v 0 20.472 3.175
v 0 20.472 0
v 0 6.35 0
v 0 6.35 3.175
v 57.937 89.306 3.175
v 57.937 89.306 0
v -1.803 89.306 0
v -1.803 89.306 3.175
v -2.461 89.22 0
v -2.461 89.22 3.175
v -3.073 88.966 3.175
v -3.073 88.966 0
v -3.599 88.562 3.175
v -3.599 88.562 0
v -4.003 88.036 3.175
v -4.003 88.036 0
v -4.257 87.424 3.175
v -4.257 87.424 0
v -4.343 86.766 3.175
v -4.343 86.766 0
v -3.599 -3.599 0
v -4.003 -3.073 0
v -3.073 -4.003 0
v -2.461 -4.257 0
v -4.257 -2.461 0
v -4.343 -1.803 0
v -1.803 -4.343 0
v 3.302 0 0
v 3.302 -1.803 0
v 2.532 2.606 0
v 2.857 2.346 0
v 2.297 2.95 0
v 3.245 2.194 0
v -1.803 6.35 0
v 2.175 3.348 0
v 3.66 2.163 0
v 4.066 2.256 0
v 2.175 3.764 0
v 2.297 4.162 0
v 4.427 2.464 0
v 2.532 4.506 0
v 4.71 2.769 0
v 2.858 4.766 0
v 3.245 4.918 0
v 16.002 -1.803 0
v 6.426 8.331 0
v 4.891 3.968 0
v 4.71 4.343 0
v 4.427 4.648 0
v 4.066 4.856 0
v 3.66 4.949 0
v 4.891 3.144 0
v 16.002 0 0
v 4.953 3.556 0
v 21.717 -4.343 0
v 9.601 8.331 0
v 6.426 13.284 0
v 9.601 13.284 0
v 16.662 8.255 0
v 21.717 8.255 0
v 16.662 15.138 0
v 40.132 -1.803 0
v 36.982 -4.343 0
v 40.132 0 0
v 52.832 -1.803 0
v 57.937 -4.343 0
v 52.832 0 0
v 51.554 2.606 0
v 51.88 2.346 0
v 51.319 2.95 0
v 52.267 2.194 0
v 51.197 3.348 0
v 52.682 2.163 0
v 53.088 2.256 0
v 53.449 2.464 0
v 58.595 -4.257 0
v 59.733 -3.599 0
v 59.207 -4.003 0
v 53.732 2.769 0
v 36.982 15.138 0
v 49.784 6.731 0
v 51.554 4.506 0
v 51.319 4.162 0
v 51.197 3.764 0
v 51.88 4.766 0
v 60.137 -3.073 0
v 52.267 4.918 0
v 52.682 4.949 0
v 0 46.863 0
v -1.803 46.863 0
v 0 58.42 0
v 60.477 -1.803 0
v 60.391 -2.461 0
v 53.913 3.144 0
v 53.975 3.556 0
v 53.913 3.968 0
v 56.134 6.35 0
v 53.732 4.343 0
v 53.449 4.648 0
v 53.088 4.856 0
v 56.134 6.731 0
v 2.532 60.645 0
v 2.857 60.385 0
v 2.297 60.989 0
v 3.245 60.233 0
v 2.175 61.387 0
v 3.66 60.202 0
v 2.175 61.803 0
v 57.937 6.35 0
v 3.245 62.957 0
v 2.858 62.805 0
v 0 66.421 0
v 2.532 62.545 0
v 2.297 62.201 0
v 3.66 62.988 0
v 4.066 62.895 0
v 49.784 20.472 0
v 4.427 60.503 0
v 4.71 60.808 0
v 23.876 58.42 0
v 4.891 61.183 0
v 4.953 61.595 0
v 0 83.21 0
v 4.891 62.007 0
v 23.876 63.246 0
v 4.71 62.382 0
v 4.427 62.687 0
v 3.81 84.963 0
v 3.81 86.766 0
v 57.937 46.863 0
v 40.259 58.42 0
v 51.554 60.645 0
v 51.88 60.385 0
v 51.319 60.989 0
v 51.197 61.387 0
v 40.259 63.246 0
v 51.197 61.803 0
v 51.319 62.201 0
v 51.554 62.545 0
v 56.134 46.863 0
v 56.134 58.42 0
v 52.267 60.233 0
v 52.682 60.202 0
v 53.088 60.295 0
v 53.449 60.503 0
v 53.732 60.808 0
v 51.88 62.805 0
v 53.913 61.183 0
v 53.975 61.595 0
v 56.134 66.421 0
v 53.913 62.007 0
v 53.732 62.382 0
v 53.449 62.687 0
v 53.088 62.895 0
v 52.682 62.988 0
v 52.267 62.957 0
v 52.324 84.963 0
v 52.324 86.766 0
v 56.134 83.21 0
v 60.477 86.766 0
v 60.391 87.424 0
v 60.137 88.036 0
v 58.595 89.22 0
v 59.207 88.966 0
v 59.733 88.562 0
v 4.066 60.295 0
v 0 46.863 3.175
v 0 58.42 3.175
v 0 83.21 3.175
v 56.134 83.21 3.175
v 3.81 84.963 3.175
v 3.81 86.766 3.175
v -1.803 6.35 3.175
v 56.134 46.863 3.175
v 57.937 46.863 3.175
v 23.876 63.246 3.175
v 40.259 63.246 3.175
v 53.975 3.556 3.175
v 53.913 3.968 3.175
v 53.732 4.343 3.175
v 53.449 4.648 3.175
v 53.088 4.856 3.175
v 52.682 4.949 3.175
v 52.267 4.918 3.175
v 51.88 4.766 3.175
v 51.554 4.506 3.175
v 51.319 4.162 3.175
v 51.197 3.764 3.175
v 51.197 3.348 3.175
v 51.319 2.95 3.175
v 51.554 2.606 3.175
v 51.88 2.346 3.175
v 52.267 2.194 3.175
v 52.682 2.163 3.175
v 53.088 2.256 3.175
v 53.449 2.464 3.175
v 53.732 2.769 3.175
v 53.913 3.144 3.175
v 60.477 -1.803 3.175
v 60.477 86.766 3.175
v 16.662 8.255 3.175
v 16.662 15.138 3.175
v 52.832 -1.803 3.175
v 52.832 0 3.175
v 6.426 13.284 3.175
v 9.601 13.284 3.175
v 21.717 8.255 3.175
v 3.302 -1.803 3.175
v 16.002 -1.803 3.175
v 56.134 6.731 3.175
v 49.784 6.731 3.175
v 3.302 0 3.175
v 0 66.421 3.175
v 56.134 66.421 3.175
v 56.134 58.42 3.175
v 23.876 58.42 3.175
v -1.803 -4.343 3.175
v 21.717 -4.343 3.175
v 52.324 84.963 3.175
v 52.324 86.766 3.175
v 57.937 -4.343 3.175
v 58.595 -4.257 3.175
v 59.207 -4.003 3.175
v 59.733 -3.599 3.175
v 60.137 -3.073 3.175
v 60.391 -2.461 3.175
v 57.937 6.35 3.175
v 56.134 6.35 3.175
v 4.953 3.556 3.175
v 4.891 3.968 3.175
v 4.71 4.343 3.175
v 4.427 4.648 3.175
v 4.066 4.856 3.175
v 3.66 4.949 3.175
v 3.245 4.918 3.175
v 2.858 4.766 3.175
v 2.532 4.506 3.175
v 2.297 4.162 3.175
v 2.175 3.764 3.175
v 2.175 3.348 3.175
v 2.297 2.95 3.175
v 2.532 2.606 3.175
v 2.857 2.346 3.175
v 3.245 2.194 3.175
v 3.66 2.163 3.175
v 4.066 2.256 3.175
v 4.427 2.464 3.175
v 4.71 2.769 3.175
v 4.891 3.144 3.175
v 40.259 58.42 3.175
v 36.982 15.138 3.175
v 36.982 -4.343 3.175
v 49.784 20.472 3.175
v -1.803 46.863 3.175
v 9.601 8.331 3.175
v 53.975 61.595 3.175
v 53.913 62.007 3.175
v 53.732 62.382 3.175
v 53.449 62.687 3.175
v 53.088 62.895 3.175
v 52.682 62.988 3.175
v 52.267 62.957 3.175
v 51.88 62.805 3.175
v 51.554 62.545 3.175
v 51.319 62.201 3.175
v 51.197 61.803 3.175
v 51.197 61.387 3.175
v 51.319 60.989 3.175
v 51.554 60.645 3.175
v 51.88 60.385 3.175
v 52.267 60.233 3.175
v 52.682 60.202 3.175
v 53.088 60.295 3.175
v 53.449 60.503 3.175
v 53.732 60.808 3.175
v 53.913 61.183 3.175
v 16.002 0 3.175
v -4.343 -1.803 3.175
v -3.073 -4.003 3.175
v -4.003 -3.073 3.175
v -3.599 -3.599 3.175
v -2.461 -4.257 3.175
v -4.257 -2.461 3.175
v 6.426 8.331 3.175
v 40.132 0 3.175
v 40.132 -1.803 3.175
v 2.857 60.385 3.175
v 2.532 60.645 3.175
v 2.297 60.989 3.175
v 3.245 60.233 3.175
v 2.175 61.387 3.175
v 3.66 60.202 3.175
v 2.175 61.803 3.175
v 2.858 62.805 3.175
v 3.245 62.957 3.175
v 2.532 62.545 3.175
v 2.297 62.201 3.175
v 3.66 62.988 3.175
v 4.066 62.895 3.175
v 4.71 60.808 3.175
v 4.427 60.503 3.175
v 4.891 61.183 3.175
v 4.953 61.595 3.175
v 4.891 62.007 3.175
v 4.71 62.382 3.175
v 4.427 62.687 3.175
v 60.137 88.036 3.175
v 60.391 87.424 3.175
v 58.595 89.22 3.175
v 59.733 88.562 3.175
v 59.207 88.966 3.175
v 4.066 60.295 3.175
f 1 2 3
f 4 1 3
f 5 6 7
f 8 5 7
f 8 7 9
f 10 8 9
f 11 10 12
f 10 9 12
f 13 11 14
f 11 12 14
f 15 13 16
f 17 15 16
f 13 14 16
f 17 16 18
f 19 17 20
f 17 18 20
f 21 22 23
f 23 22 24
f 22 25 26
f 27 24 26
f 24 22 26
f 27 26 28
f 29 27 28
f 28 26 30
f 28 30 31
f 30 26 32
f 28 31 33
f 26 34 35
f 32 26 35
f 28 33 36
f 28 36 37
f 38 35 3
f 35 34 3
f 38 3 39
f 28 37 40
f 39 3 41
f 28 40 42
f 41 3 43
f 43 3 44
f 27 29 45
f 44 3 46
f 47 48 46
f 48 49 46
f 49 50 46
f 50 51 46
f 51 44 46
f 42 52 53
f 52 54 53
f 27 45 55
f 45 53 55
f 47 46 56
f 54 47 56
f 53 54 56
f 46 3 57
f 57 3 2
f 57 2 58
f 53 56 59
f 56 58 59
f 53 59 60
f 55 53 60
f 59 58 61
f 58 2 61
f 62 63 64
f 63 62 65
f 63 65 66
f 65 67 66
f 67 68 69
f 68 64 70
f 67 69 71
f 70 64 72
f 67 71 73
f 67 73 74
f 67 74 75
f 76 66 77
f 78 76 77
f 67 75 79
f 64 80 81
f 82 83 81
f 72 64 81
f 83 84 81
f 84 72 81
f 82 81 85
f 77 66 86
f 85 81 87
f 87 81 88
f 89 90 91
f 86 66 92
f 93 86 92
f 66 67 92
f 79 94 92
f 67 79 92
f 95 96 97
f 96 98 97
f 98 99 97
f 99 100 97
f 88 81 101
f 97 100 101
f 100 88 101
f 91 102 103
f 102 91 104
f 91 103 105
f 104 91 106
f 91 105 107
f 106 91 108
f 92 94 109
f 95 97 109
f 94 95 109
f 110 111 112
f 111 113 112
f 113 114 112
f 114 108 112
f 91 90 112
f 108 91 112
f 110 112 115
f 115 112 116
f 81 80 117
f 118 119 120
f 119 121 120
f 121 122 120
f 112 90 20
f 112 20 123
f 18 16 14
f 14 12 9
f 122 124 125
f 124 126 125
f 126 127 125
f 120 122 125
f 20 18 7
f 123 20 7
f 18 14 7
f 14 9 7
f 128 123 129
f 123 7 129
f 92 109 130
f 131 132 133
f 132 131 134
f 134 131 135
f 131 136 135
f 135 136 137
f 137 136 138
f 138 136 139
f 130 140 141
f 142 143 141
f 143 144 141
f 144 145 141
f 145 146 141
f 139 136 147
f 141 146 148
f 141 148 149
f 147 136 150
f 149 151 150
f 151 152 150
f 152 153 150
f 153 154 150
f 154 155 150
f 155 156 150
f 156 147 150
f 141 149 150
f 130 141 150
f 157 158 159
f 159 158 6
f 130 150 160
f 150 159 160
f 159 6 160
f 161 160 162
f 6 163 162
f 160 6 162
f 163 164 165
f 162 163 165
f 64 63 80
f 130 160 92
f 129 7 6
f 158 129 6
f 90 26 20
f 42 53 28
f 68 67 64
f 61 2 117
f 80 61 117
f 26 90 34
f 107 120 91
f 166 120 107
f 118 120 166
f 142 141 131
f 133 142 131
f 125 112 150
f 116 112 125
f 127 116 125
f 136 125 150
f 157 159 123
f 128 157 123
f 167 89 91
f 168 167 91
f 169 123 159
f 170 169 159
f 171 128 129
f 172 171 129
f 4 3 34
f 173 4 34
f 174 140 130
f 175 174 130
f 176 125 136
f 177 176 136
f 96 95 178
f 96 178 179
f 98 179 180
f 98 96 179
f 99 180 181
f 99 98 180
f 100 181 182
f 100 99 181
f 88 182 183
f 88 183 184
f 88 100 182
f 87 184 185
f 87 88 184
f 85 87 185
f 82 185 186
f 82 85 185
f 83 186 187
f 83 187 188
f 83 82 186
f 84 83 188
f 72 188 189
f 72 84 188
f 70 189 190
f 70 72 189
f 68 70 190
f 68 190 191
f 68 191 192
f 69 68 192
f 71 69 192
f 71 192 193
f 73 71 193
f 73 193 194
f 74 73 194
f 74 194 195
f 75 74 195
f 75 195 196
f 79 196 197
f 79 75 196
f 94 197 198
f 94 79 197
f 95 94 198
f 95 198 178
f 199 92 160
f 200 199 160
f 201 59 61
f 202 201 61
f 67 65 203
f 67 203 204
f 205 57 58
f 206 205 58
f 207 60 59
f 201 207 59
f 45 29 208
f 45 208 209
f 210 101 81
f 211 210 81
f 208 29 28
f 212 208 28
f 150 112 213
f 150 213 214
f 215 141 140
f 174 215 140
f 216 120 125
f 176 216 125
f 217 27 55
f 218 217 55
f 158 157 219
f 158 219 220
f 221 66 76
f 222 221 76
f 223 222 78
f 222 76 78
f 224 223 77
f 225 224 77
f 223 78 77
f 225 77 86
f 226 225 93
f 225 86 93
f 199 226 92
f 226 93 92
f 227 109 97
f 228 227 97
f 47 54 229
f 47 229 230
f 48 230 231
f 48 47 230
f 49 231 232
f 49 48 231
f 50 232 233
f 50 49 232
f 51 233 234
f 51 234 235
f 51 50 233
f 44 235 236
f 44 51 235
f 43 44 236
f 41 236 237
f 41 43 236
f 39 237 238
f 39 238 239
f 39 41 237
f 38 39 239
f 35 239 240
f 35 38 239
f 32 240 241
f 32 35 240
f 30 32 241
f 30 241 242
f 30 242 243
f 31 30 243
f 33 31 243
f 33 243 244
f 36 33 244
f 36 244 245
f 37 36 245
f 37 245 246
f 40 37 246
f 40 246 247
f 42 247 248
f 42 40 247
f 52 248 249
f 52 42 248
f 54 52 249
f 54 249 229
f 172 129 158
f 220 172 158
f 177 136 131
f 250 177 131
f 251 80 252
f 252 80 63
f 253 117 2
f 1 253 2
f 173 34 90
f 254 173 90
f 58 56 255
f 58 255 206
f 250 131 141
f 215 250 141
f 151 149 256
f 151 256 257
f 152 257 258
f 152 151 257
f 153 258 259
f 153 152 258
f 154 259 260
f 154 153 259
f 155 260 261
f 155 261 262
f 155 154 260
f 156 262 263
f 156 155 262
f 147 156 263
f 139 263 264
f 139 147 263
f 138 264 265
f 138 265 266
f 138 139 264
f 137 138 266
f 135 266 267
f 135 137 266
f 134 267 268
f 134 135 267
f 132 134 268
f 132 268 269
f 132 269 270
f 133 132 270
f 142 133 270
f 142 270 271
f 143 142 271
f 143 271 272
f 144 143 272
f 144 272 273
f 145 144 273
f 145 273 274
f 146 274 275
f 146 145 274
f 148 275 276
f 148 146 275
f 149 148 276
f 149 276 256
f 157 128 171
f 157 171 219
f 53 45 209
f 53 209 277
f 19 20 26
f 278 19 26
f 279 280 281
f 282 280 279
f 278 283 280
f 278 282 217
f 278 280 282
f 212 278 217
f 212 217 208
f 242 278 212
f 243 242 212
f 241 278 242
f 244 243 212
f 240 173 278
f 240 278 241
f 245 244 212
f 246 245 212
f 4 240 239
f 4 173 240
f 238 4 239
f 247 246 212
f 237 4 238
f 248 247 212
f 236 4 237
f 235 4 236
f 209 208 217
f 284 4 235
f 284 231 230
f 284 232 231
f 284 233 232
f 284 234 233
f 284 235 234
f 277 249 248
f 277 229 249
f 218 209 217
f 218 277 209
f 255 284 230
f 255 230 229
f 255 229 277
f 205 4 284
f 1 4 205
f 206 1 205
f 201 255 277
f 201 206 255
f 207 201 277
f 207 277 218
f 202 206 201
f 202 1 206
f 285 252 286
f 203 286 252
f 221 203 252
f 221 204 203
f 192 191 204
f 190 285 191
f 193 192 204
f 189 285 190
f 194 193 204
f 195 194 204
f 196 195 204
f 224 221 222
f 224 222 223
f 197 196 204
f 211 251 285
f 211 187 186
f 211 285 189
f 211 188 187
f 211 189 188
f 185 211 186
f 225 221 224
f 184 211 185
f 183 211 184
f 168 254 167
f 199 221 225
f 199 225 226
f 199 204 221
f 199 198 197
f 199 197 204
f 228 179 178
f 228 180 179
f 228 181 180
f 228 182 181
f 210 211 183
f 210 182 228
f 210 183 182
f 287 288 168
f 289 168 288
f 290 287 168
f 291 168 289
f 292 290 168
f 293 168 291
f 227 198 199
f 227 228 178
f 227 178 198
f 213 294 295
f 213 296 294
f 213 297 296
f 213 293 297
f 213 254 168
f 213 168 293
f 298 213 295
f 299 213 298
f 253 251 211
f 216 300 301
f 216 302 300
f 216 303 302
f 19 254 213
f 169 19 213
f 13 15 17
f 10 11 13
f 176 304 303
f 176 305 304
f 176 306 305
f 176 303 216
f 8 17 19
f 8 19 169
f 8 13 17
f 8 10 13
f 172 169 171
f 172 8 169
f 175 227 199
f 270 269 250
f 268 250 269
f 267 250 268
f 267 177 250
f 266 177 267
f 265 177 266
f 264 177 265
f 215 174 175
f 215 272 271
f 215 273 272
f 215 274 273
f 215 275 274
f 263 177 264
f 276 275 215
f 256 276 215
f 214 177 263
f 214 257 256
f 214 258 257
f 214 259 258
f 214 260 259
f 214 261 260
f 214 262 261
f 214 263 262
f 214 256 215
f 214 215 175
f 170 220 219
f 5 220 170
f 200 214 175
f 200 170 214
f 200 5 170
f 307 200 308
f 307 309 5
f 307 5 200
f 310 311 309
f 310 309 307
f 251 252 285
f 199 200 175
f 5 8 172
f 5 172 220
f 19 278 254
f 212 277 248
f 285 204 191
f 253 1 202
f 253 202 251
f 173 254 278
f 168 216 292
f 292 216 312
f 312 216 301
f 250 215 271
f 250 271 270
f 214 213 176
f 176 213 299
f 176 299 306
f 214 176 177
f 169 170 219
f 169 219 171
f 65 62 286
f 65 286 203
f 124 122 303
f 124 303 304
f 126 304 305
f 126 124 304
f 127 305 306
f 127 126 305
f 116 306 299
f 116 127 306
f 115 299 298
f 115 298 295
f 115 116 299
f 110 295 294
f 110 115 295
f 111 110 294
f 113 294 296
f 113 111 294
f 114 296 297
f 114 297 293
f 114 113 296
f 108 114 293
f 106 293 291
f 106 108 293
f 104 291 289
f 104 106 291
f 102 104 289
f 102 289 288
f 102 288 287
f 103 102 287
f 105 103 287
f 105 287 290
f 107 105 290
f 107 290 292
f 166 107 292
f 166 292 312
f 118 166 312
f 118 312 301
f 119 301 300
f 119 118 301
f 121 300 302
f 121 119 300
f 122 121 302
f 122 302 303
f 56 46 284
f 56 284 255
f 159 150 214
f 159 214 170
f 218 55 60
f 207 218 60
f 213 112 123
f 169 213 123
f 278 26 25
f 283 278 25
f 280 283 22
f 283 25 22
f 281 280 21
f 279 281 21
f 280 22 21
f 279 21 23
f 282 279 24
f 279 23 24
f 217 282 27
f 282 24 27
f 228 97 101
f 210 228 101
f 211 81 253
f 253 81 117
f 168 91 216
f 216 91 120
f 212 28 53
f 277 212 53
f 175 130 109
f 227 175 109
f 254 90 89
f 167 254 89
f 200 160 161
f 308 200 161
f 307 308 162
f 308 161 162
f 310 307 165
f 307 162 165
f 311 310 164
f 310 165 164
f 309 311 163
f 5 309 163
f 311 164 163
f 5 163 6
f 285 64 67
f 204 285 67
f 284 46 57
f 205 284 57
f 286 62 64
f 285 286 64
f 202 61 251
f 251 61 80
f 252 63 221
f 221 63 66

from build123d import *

# Parameters (mm, degrees)
SKETCH1_R           = 1.397
SKETCH1_W           = 12.7
SKETCH1_H           = 1.8034
SKETCH1_W_2         = 3.175
SKETCH1_H_2         = 4.953
SKETCH1_W_3         = 56.134
SKETCH1_H_3         = 16.7894
SKETCH1_W_4         = 48.514
BOSS_EXTRUDE1_DEPTH = 3.175


with BuildPart() as part:
    # Sketch1 → Boss-Extrude1 (new body)
    with BuildSketch(Plane.XY):
        with BuildLine():
            Line((36.9824, 15.1384), (36.9824, -4.3434))
            Line((36.9824, -4.3434), (57.9374, -4.3434))
            ThreePointArc((57.9374, -4.3434), (59.733451224, -3.599451224), (60.4774, -1.8034))
            Line((60.4774, -1.8034), (60.4774, 86.7664))
            ThreePointArc((60.4774, 86.7664), (59.733451224, 88.562451224), (57.9374, 89.3064))
            Line((57.9374, 89.3064), (-1.8034, 89.3064))
            ThreePointArc((-1.8034, 89.3064), (-3.599451224, 88.562451224), (-4.3434, 86.7664))
            Line((-4.3434, 86.7664), (-4.3434, -1.8034))
            ThreePointArc((-4.3434, -1.8034), (-3.599451224, -3.599451224), (-1.8034, -4.3434))
            Line((-1.8034, -4.3434), (21.717, -4.3434))
            Line((21.717, -4.3434), (21.717, 8.255))
            Line((21.717, 8.255), (16.6624, 8.255))
            Line((16.6624, 8.255), (16.6624, 15.1384))
            Line((16.6624, 15.1384), (36.9824, 15.1384))
        make_face()
        with Locations((3.556, 3.556)):
            Circle(SKETCH1_R, mode=Mode.SUBTRACT)
        with Locations((9.652, -0.9017)):
            Rectangle(SKETCH1_W, SKETCH1_H, mode=Mode.SUBTRACT)
        with Locations((8.0137, 10.8077)):
            Rectangle(SKETCH1_W_2, SKETCH1_H_2, mode=Mode.SUBTRACT)
        with Locations((46.482, -0.9017)):
            Rectangle(SKETCH1_W, SKETCH1_H, mode=Mode.SUBTRACT)
        with Locations((52.578, 3.556)):
            Circle(SKETCH1_R, mode=Mode.SUBTRACT)
        Polygon((49.784, 20.4724), (0, 20.4724), (0, 6.35), (-1.8034, 6.35), (-1.8034, 46.863), (0, 46.863), (0, 58.42), (23.876, 58.42), (23.876, 63.246), (40.259, 63.246), (40.259, 58.42), (56.134, 58.42), (56.134, 46.863), (57.9374, 46.863), (57.9374, 6.35), (56.134, 6.35), (56.134, 6.731), (49.784, 6.731), align=None, mode=Mode.SUBTRACT)
        with Locations((28.067, 74.8157)):
            Rectangle(SKETCH1_W_3, SKETCH1_H_3, mode=Mode.SUBTRACT)
        with Locations((28.067, 85.8647)):
            Rectangle(SKETCH1_W_4, SKETCH1_H, mode=Mode.SUBTRACT)
        with Locations((3.556, 61.595)):
            Circle(SKETCH1_R, mode=Mode.SUBTRACT)
        with Locations((52.578, 61.595)):
            Circle(SKETCH1_R, mode=Mode.SUBTRACT)
    extrude(amount=BOSS_EXTRUDE1_DEPTH)


solid = part.part
